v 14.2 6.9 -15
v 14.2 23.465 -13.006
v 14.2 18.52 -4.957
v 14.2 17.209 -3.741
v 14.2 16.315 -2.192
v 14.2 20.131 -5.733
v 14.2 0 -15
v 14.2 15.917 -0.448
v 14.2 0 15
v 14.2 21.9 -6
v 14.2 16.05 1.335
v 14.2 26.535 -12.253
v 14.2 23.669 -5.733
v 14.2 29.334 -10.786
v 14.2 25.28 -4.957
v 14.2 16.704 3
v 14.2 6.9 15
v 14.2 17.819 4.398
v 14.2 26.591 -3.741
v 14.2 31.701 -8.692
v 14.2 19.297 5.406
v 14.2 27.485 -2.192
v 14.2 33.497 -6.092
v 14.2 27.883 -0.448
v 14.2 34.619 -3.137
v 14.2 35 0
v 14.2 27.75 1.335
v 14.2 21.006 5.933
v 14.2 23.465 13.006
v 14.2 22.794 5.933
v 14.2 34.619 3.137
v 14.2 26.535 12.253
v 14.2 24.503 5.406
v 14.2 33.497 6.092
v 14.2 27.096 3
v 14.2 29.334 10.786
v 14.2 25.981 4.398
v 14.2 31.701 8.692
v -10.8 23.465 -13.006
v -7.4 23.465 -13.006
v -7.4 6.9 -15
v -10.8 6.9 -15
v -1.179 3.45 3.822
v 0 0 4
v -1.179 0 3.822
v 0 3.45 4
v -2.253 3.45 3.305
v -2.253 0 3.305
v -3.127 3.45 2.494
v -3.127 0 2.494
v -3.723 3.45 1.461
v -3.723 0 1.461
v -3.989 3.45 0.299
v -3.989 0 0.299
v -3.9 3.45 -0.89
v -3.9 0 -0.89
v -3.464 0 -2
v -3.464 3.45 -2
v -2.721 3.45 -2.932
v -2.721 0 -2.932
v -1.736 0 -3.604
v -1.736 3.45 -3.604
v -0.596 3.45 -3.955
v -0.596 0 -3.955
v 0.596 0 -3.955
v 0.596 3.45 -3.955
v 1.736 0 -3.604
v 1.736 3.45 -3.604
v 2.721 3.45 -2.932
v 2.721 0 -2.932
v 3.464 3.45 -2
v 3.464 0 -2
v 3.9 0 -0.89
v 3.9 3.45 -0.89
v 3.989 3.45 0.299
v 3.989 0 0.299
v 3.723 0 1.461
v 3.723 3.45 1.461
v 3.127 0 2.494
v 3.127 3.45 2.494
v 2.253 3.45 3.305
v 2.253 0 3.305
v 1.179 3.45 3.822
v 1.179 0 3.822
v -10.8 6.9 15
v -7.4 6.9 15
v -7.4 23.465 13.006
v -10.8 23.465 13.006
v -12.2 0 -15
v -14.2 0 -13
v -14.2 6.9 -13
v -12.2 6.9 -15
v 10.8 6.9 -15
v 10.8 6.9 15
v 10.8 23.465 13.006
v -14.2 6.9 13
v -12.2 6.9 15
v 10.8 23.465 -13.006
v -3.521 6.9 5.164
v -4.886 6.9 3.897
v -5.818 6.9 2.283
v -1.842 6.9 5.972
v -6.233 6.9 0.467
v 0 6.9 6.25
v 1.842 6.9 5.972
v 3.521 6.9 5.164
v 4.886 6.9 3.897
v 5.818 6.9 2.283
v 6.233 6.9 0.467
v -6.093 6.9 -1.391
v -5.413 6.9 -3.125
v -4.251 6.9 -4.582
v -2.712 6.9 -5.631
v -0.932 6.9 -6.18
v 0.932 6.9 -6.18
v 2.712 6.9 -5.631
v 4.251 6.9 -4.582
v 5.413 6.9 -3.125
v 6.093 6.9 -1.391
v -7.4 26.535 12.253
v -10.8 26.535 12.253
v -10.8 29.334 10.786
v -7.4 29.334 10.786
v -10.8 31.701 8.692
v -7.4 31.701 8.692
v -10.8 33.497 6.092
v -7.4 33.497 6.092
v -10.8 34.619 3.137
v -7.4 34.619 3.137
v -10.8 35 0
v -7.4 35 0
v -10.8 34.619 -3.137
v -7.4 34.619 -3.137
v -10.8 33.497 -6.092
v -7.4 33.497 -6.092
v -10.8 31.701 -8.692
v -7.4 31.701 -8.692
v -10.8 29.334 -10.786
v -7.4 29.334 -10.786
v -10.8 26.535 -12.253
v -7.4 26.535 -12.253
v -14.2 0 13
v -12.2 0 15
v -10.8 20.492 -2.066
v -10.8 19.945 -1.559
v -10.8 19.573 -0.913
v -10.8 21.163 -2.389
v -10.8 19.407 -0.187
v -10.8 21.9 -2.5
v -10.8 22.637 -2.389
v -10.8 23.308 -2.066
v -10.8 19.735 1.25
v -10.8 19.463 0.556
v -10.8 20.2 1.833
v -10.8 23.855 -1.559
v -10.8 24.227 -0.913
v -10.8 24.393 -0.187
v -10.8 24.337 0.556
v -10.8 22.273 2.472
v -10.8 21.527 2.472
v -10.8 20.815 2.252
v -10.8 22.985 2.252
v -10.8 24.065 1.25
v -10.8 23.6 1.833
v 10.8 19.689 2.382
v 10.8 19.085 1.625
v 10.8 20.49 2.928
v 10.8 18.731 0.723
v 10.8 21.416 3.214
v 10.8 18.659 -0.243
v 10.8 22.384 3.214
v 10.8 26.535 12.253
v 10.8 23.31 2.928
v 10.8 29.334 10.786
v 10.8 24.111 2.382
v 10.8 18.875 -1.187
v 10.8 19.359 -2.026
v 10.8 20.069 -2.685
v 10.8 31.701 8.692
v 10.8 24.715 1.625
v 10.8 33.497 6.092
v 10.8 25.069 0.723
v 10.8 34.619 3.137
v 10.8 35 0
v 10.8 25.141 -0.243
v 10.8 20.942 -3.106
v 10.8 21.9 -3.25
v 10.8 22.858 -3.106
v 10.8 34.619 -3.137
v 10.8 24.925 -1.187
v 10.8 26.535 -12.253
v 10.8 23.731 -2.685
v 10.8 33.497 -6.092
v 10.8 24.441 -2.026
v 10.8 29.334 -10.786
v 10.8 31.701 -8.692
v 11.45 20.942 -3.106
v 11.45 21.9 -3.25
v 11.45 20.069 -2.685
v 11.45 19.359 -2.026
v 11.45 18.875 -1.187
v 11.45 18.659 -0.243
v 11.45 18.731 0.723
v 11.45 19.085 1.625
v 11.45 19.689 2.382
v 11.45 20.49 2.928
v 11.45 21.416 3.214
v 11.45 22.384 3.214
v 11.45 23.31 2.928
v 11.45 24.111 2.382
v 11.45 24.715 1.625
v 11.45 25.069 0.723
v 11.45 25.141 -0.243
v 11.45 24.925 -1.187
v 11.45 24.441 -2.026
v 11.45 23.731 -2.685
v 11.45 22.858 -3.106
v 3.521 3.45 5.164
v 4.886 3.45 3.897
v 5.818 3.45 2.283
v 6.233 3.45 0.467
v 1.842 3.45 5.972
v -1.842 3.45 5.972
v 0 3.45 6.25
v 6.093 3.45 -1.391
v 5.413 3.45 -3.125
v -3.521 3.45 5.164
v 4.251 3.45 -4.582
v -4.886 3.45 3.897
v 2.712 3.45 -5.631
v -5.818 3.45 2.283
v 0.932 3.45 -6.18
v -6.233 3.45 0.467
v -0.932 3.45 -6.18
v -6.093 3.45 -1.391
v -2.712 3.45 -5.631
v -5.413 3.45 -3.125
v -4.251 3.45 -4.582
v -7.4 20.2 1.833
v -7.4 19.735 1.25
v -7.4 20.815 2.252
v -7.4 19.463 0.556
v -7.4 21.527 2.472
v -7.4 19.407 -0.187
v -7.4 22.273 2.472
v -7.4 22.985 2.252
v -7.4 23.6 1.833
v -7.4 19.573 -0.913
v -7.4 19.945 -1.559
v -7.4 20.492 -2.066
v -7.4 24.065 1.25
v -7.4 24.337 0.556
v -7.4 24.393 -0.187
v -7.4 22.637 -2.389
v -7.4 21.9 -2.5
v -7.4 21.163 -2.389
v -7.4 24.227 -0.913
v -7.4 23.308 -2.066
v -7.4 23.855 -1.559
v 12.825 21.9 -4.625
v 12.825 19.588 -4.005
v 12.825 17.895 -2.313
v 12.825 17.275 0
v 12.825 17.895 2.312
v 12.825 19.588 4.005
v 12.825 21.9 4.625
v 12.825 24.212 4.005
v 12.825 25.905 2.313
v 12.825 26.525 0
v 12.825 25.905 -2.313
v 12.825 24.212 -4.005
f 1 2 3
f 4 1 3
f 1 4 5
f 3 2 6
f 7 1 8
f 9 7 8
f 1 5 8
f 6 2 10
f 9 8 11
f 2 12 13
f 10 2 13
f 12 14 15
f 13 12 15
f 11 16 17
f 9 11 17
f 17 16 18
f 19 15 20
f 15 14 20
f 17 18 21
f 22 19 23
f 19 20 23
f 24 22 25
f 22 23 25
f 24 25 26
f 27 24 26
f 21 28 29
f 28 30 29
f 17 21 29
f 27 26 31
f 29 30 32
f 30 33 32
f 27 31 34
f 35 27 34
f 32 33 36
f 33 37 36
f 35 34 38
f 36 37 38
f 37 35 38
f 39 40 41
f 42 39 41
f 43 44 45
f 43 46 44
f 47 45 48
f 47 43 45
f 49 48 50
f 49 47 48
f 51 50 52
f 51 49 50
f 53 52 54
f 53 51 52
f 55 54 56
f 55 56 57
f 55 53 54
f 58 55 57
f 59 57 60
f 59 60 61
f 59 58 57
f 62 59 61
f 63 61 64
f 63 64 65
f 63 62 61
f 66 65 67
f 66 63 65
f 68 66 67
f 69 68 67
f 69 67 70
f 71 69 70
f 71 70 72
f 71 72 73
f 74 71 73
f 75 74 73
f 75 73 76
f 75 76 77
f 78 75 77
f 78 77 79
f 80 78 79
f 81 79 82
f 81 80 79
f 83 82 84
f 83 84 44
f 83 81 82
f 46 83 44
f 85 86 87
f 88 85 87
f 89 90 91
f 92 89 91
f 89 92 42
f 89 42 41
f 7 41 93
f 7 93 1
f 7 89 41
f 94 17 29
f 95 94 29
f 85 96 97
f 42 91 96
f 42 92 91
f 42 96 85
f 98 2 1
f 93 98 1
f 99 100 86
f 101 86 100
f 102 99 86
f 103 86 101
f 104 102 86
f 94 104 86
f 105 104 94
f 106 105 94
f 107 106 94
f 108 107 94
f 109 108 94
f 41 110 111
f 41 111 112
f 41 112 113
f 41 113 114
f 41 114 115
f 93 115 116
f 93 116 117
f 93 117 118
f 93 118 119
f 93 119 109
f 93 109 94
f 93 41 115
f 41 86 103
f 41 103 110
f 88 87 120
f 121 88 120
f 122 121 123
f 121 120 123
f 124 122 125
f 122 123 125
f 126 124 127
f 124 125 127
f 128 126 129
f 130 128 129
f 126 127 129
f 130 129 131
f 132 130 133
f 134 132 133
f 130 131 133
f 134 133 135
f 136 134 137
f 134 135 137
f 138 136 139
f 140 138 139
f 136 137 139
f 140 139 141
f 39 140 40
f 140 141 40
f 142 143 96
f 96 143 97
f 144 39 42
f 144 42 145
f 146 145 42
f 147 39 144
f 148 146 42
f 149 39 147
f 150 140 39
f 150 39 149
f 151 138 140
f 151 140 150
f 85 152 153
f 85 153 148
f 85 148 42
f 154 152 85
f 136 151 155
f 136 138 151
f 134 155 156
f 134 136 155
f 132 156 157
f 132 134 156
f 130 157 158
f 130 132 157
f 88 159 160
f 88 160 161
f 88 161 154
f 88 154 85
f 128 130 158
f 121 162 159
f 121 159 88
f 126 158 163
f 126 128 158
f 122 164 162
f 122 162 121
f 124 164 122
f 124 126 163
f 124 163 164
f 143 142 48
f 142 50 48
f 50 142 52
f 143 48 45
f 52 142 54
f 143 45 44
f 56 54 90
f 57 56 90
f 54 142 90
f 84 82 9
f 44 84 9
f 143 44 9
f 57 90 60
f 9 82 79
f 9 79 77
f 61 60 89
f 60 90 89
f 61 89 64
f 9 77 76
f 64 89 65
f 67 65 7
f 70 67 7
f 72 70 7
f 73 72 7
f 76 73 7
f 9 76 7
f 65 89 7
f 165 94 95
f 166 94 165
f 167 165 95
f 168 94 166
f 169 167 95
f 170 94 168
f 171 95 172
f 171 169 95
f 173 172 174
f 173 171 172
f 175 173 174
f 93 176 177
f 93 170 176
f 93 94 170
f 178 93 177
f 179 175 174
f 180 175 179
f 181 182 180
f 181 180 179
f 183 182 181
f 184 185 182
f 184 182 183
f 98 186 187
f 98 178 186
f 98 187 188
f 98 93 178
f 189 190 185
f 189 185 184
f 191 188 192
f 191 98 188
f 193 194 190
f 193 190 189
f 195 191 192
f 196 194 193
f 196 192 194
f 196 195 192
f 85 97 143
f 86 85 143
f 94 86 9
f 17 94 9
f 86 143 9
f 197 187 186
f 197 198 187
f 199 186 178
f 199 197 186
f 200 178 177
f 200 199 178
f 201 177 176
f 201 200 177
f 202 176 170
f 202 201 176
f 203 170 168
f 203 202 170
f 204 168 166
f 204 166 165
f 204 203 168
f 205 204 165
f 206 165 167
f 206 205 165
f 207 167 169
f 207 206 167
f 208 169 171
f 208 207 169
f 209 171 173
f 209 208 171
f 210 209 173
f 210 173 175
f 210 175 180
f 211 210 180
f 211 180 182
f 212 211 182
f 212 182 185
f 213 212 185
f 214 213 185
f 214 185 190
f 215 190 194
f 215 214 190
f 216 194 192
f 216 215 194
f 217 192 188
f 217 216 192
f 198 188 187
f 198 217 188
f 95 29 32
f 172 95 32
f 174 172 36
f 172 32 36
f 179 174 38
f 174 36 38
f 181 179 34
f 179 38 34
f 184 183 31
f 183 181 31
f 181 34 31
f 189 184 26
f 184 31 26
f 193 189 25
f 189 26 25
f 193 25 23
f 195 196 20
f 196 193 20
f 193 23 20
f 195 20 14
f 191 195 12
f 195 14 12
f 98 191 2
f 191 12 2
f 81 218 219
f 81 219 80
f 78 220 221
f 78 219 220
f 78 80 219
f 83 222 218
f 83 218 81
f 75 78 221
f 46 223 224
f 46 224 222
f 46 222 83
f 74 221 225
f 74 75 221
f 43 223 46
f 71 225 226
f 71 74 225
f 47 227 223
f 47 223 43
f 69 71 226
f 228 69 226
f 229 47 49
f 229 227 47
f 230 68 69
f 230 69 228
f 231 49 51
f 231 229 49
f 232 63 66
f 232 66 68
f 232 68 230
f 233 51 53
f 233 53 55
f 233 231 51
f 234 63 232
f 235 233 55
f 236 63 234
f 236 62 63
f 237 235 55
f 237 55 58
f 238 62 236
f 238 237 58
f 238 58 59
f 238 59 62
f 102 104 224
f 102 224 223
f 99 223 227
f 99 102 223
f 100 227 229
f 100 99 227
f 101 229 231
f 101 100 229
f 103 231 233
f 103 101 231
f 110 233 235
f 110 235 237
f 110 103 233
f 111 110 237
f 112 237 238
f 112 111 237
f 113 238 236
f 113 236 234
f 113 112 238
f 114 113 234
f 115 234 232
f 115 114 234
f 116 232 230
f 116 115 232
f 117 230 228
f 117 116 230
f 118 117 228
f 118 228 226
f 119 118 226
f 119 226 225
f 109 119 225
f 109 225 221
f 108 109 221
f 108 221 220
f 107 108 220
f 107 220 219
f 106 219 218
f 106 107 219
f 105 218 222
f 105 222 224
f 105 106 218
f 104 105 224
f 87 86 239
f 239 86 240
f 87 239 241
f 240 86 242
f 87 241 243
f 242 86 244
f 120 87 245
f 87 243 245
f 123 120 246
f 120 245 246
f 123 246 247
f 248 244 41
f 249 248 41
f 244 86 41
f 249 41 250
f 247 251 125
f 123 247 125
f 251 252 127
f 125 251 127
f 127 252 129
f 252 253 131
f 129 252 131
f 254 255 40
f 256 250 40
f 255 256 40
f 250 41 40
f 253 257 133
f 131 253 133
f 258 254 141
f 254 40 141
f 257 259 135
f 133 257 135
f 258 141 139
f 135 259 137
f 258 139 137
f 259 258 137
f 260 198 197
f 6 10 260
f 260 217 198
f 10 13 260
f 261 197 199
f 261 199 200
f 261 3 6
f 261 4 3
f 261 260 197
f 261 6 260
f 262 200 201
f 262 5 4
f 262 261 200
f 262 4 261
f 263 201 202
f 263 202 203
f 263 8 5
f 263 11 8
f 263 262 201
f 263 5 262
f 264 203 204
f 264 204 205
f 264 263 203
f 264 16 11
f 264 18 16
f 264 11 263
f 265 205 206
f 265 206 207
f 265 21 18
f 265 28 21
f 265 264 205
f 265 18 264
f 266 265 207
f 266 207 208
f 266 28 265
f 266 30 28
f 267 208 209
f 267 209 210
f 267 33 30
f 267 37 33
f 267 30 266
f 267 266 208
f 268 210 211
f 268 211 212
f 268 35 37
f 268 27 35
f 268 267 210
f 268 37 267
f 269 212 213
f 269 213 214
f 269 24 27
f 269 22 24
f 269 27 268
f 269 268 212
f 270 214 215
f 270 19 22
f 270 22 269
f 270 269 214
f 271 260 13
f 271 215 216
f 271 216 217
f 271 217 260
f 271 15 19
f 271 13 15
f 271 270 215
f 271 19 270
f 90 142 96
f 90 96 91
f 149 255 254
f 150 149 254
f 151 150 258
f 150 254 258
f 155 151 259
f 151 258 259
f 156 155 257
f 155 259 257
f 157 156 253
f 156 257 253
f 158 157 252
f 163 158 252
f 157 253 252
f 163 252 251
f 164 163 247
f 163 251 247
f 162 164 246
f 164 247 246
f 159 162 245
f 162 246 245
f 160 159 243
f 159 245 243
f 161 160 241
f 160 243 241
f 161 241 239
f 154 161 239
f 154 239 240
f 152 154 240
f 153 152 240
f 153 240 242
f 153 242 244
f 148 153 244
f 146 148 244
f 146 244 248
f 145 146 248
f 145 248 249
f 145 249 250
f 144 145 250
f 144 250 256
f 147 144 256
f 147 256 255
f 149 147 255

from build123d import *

# Parameters (mm, degrees)
SKETCH_1_W               = 28.4
SKETCH_1_H               = 30
EXTRUDE_1_DEPTH          = 6.9
EXTRUDE_2_DEPTH          = 25
SKETCH_4_W               = 18.2
SKETCH_4_H               = 28.1
CUT_EXTRUDE_1_DEPTH      = 16
CUT_EXTRUDE_1_DEPTH_BACK = 16
CHAMFER_1_SIZE           = 2
HOLE_WIZARD_M61_D        = 5
HOLE_WIZARD_M61_DEPTH    = 3.4


with BuildPart() as part:
    # Эскиз1 → Бобышка-Вытянуть1 (new body)
    with BuildSketch(Plane(origin=(0, 0, 0), x_dir=(1, 0, 0), z_dir=(0, 1, 0))):
        Rectangle(SKETCH_1_W, SKETCH_1_H)
    extrude(amount=EXTRUDE_1_DEPTH)

    # Эскиз2 → Вырез-Повернуть1 (revolve, cut)
    with BuildSketch(Plane.XY, mode=Mode.PRIVATE) as cut_revolve_1_sk:
        Polygon((-4, 0), (-4, 3.45), (-6.25, 3.45), (-6.25, 6.9), (0, 6.9), (0, 0), align=None)
    revolve(cut_revolve_1_sk.sketch.rotate(Axis((0, 6.9, 0), (0, -1, 0)), 270), axis=Axis((0, 6.9, 0), (0, -1, 0)), mode=Mode.SUBTRACT)  # turned: the seam where the file's is

    # Эскиз3 → Бобышка-Вытянуть2 (add)
    with BuildSketch(Plane(origin=(14.2, 0, 0), x_dir=(0, 0, -1), z_dir=(1, 0, 0))):
        with BuildLine():
            Line((-15, 6.9), (-13.006126808, 23.465460141))
            ThreePointArc((-13.006126808, 23.465460141), (0, 35), (13.006126808, 23.465460141))
            Line((13.006126808, 23.465460141), (15, 6.9))
            Line((15, 6.9), (-15, 6.9))
        make_face()
    extrude(amount=-EXTRUDE_2_DEPTH)

    # Эскиз4 → Вырез-Вытянуть1 (cut, two sides)
    with BuildSketch(Plane.XY) as cut_extrude_1_sk:
        with Locations((1.7, 20.95)):
            Rectangle(SKETCH_4_W, SKETCH_4_H)
    extrude(amount=CUT_EXTRUDE_1_DEPTH, mode=Mode.SUBTRACT)
    extrude(cut_extrude_1_sk.sketch, amount=-CUT_EXTRUDE_1_DEPTH_BACK, mode=Mode.SUBTRACT)

    # Фаска1
    chamfer_1_edges = [part.edges().sort_by_distance(p)[0] for p in [
        (-14.2, 3.45, -15),
        (-14.2, 3.45, 15),
    ]]
    chamfer(chamfer_1_edges, length=CHAMFER_1_SIZE)

    # Отверстие обработанное метчиком M61
    with Locations(Plane.ZY.offset(10.8)):
        with Locations((0, 21.9)):
            Hole(HOLE_WIZARD_M61_D / 2, depth=HOLE_WIZARD_M61_DEPTH)

    # Эскиз10 → Зенковка для винта с полупотайной головкой 1 (revolve, cut)
    with BuildSketch(Plane(origin=(14.2, 21.9, 0), x_dir=(0, 0, -1), z_dir=(0, 1, 0))):
        Polygon((0, 0), (0, 3.4), (3.25, 3.4), (3.25, 2.75), (6, 0), align=None)
    revolve(axis=Axis((20.55, 21.9, 0), (-1, 0, 0)), mode=Mode.SUBTRACT)


solid = part.part
